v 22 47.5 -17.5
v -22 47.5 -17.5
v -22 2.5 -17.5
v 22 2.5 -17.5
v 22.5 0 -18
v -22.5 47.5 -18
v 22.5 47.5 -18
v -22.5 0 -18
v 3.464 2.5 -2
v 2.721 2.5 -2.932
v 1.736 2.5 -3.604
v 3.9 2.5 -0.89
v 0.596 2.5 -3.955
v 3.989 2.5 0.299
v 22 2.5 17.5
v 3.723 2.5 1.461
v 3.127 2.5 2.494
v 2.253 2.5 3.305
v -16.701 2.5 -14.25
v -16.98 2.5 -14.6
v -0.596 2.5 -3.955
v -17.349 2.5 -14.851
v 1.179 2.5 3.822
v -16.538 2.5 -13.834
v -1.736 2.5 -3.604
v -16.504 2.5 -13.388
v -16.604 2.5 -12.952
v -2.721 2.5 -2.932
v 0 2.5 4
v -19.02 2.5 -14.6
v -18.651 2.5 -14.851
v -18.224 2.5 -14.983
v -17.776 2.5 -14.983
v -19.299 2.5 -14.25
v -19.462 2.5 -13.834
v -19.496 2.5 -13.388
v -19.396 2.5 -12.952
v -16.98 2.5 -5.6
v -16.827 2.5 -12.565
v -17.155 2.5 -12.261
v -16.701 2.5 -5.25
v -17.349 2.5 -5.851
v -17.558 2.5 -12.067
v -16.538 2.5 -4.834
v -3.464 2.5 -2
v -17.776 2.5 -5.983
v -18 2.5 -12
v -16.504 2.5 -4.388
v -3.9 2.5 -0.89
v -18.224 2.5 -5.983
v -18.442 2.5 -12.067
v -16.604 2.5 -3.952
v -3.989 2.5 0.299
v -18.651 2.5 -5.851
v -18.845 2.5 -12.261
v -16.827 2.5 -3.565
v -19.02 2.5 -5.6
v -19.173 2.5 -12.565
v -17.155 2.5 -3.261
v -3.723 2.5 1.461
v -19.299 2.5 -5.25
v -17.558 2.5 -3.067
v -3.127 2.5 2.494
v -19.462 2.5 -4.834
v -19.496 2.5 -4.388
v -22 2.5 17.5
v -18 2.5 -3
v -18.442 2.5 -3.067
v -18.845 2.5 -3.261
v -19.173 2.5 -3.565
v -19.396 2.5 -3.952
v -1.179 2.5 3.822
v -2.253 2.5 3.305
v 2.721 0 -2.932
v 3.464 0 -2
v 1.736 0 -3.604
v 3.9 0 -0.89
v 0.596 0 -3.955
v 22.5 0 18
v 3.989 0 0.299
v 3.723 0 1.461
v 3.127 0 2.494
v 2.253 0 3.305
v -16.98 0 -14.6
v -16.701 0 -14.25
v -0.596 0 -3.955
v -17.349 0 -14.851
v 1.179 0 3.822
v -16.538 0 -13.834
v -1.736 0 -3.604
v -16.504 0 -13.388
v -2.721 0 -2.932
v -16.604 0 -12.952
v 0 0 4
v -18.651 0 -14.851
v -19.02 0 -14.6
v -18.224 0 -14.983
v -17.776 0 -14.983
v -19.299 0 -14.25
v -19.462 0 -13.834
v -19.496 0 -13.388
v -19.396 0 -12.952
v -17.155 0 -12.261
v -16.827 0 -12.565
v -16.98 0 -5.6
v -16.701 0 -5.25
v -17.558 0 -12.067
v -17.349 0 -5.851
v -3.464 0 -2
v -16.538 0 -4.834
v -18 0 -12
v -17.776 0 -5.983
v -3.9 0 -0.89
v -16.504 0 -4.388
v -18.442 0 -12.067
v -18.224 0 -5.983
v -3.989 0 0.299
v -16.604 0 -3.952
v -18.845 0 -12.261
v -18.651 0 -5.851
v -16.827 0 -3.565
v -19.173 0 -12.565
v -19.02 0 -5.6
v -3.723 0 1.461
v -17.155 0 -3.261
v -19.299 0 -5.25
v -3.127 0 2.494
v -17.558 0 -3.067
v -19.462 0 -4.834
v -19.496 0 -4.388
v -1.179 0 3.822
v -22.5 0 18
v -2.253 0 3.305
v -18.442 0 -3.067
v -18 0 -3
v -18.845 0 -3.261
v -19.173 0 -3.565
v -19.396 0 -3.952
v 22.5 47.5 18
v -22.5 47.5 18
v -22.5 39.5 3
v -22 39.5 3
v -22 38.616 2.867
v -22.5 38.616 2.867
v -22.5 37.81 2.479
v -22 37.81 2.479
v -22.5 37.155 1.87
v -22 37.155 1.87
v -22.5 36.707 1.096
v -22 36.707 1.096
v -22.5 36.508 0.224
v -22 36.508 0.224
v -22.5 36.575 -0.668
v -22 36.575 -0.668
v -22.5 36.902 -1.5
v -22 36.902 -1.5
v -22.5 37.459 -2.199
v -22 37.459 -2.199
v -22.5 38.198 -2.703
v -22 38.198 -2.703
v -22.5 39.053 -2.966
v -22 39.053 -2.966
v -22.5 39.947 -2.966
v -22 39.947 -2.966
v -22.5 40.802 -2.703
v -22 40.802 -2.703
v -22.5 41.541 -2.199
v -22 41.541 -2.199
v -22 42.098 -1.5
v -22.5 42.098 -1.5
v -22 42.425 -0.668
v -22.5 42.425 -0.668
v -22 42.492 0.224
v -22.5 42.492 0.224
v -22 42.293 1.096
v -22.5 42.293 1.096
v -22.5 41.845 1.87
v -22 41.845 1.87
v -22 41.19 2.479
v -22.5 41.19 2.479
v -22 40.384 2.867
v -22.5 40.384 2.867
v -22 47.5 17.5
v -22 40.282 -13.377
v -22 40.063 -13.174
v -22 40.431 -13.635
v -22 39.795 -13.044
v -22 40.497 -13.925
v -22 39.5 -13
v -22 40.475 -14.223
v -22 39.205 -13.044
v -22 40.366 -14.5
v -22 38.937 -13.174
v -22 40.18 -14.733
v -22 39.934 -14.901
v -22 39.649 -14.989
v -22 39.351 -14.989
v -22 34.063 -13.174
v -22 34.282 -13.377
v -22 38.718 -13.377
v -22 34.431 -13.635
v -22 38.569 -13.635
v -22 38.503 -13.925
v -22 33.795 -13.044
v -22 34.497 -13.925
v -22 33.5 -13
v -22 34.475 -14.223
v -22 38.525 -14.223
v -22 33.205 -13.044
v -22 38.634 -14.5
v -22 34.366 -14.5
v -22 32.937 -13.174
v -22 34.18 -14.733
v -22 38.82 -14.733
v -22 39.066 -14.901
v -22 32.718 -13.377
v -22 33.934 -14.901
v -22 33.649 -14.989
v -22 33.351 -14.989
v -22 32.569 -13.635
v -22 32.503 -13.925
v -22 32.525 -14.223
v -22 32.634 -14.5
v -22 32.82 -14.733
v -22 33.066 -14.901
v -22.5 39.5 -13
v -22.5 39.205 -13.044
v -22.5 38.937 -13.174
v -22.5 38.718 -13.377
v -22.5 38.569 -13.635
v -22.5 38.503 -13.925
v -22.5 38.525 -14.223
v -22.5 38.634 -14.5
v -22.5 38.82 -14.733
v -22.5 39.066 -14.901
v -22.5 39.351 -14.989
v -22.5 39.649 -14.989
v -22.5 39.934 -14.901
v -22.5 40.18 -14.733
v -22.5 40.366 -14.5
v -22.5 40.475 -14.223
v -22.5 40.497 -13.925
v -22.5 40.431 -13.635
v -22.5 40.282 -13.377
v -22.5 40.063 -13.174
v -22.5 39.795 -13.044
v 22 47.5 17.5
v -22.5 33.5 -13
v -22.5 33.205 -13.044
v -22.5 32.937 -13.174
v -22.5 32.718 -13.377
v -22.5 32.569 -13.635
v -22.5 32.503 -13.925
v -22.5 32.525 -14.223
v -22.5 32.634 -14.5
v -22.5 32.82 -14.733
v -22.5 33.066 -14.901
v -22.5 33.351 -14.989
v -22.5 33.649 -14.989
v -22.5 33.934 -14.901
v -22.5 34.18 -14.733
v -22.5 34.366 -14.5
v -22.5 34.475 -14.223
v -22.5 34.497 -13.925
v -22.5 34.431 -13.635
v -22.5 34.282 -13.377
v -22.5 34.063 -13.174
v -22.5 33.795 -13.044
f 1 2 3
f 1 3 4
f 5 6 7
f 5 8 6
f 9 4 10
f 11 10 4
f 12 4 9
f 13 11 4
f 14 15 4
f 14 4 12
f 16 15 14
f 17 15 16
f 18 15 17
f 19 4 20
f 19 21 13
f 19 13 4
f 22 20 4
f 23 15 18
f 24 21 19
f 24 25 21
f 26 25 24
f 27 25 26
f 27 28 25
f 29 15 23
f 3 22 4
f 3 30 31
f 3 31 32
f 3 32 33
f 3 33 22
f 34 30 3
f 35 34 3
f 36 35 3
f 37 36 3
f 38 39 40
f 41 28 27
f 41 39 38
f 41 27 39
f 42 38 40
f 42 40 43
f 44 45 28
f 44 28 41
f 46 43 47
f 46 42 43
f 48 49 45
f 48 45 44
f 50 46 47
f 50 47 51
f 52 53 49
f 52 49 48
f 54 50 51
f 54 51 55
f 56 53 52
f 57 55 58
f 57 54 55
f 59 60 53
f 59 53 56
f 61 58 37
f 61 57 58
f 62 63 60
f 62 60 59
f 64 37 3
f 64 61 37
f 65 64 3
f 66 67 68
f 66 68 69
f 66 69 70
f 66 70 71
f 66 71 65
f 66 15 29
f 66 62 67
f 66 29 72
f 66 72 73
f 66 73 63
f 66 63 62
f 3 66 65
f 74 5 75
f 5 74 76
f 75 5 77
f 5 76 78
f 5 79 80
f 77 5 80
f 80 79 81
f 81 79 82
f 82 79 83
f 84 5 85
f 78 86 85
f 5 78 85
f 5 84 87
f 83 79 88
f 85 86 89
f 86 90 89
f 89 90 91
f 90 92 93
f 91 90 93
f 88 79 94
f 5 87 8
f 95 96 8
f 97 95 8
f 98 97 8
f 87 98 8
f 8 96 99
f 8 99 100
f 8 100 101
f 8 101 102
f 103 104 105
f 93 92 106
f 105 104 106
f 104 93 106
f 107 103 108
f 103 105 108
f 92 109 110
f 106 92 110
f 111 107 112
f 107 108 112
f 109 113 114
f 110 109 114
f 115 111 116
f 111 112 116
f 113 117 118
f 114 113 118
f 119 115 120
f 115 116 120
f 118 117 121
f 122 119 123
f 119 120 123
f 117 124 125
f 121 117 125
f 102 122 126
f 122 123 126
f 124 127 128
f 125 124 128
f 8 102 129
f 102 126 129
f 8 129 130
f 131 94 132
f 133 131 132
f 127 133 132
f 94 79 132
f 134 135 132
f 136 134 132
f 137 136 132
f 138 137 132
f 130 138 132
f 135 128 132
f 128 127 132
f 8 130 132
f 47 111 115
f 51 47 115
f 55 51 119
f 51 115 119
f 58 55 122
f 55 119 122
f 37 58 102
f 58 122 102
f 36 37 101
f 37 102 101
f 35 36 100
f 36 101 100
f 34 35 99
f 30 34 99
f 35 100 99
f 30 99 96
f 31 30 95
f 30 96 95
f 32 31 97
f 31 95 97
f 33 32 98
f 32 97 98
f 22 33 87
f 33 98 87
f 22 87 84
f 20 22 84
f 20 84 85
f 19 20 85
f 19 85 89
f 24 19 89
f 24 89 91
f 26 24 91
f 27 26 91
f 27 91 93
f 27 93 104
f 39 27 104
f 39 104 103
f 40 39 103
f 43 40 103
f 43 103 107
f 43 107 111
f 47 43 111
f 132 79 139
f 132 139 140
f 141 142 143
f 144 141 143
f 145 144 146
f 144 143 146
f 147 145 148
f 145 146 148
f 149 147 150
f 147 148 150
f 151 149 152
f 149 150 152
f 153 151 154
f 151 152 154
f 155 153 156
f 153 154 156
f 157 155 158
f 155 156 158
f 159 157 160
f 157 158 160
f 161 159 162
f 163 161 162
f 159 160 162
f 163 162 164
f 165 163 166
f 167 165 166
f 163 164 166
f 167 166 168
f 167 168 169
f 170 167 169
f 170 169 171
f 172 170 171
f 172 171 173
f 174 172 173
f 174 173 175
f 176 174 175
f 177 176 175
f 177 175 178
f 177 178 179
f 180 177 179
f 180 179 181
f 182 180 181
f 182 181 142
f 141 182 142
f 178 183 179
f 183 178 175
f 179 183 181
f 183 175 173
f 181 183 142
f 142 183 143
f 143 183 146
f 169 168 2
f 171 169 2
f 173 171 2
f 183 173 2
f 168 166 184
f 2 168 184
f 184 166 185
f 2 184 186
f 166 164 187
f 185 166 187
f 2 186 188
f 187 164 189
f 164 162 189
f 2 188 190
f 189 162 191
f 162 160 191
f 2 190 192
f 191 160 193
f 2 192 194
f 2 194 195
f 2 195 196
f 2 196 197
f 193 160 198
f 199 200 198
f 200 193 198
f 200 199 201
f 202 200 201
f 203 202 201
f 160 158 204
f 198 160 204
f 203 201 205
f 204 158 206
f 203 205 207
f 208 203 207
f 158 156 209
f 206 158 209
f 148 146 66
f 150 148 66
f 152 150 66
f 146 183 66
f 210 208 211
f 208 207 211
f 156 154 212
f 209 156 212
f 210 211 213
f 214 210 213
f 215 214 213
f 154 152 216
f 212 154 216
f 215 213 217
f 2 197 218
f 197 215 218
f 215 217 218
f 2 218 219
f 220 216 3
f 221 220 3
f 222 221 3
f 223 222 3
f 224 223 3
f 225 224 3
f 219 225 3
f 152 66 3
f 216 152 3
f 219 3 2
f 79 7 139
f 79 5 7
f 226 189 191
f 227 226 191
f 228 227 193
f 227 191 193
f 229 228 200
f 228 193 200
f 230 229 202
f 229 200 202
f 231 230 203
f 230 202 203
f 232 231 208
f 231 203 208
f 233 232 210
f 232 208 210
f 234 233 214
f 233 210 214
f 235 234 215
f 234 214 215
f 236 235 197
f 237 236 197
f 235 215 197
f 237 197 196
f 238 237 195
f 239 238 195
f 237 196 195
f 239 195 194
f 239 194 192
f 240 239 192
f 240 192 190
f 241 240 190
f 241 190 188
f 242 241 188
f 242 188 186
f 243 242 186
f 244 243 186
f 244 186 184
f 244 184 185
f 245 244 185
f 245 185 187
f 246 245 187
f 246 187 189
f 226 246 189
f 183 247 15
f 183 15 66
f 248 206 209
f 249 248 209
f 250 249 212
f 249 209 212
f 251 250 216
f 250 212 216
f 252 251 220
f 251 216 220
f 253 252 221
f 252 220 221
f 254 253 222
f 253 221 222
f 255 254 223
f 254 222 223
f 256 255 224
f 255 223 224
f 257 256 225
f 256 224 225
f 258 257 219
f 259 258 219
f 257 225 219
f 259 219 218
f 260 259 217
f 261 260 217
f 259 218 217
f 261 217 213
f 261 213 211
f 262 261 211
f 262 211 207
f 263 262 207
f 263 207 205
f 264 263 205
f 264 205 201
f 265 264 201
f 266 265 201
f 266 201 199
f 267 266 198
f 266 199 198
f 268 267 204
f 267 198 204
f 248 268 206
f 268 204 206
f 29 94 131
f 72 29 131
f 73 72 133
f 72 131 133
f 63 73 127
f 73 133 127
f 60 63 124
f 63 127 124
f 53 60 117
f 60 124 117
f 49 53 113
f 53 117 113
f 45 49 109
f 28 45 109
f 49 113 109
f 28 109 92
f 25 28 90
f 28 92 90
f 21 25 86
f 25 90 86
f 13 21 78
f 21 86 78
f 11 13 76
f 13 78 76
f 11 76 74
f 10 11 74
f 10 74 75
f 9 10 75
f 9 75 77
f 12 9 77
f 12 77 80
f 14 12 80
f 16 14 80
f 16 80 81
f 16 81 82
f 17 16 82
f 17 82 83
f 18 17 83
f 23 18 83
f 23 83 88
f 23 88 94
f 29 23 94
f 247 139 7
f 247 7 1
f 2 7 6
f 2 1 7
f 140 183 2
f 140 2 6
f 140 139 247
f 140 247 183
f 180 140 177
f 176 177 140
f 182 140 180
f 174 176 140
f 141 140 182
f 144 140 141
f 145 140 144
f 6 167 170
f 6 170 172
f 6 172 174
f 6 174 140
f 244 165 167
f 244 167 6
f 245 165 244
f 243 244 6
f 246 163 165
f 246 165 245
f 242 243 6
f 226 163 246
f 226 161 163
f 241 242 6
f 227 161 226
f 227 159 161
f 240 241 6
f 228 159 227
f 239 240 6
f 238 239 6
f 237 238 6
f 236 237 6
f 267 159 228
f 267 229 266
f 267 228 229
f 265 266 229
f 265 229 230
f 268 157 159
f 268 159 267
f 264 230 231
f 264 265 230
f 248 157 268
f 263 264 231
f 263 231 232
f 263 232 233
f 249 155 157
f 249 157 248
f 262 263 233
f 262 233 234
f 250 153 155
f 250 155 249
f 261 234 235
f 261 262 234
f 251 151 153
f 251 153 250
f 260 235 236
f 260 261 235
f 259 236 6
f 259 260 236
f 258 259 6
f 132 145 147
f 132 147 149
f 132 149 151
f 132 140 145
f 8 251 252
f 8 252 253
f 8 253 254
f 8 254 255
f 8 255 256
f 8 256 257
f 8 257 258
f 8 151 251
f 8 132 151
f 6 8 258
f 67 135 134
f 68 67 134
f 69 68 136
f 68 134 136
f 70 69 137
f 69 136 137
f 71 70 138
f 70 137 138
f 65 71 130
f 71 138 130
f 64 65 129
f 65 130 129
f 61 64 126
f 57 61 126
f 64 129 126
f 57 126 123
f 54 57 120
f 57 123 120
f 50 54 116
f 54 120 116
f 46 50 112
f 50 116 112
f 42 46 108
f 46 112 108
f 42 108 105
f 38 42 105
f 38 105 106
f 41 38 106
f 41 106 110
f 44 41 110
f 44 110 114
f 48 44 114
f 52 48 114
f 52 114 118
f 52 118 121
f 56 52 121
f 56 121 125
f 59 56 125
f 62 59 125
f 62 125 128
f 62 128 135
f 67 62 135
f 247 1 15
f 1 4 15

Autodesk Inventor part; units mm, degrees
ref_plane "YZ Plane" through (0, 0, 0) normal (1, 0, 0) x (0, 1, 0)
ref_plane "XZ Plane" through (0, 0, 0) normal (0, 1, 0) x (-1, 0, 0)
ref_plane "XY Plane" through (0, 0, 0) normal (0, 0, 1) x (1, 0, 0)
sketch "Sketch1" plane through (0, 0, 0) normal (0, 1, 0) x (-1, 0, 0)
  line L0 (-22.5, 18) -> (22.5, 18)
  line L1 (22.5, 18) -> (22.5, -18)
  line L2 (22.5, -18) -> (-22.5, -18)
  line L3 (-22.5, -18) -> (-22.5, 18)
  line L4 (-22.5, 18) -> (22.5, -18) construction
  line L5 (22.5, 18) -> (-22.5, -18) construction
  line L6 (-22, 17.5) -> (22, 17.5)
  line L7 (22, 17.5) -> (22, -17.5)
  line L8 (22, -17.5) -> (-22, -17.5)
  line L9 (-22, -17.5) -> (-22, 17.5)
  line L10 (-22, 17.5) -> (22, -17.5) construction
  line L11 (22, 17.5) -> (-22, -17.5) construction
  point P0 (0, 0)
  dimension "d0" = 45
  dimension "d1" = 36
  dimension "d2" = 44
  dimension "d3" = 35
extrude "Extrusion1" add sketch "Sketch1" along normal blind 2.5 contours L6 L7 L8 L9
extrude "Extrusion2" add sketch "Sketch1" along normal blind 47.5
sketch "Sketch2" plane through (0, 2.5, 0) normal (0, 1, 0) x (1, 0, 0)
  line L0 (-22.5, 18) -> (-22.5, -18) projected
  line L1 (22.5, 18) -> (-22.5, 18)
  line L2 (-22.5, 18) -> (-22.5, -18)
  line L3 (-22.5, -18) -> (22.5, -18)
  line L4 (22.5, -18) -> (22.5, 18)
  line L5 (22.5, 18) -> (-22.5, -18) construction
  line L6 (-22.5, 18) -> (22.5, -18) construction
  line L7 (22.5, 18) -> (-22.5, 18) projected
  line L8 (-22.5, 18) -> (-22.5, 13.5)
  line L9 (-22.5, 13.5) -> (-18, 13.5)
  line L10 (-18, 13.5) -> (-18, 4.5)
  point P0 (0, 0)
  point P1 (0, 0)
  dimension "d8" = 4.5
  dimension "d9" = 4.5
  dimension "d10" = 9
hole "Hole1" at (-18, 2.5, -4.5) at (-18, 2.5, -13.5) direction (0, -1, 0) diameter 3 depth 8
hole "Hole2" at (0, 2.5, 0) direction (0, -1, 0) diameter 8 depth 8
sketch "Sketch3" plane through (-22.5, 0, -18) normal (-1, 0, 0) x (0, 0, 1)
  line L0 (0, 0) -> (36, 0) projected
  line L1 (36, 0) -> (36, 47.5) projected
  line L2 (0, 47.5) -> (36, 47.5) projected
  line L3 (0, 0) -> (0, 47.5) projected
  line L4 (0, 47.5) -> (18, 47.5)
  line L5 (0, 47.5) -> (36, 47.5) projected
  line L6 (18, 47.5) -> (18, 39.5)
  line L7 (18, 39.5) -> (4, 39.5)
  line L8 (4, 39.5) -> (4, 33.5)
  point P0 (18, 0)
  dimension "d25" = 18
  dimension "d26" = 8
  dimension "d27" = 14
  dimension "d28" = 6
hole "Hole3" at (-22.5, 33.5, -14) at (-22.5, 39.5, -14) direction (1, 0, 0) diameter 2 depth 8
hole "Hole4" at (-22.5, 39.5, 0) direction (1, 0, 0) diameter 6 depth 8
thread "Thread1" size "M2x0.25" class "6H" standard "ANSI Metric M Profile" full length
thread "Thread2" size "M2x0.25" class "6H" standard "ANSI Metric M Profile" full length
properties part number "HUDISN-1-53"
